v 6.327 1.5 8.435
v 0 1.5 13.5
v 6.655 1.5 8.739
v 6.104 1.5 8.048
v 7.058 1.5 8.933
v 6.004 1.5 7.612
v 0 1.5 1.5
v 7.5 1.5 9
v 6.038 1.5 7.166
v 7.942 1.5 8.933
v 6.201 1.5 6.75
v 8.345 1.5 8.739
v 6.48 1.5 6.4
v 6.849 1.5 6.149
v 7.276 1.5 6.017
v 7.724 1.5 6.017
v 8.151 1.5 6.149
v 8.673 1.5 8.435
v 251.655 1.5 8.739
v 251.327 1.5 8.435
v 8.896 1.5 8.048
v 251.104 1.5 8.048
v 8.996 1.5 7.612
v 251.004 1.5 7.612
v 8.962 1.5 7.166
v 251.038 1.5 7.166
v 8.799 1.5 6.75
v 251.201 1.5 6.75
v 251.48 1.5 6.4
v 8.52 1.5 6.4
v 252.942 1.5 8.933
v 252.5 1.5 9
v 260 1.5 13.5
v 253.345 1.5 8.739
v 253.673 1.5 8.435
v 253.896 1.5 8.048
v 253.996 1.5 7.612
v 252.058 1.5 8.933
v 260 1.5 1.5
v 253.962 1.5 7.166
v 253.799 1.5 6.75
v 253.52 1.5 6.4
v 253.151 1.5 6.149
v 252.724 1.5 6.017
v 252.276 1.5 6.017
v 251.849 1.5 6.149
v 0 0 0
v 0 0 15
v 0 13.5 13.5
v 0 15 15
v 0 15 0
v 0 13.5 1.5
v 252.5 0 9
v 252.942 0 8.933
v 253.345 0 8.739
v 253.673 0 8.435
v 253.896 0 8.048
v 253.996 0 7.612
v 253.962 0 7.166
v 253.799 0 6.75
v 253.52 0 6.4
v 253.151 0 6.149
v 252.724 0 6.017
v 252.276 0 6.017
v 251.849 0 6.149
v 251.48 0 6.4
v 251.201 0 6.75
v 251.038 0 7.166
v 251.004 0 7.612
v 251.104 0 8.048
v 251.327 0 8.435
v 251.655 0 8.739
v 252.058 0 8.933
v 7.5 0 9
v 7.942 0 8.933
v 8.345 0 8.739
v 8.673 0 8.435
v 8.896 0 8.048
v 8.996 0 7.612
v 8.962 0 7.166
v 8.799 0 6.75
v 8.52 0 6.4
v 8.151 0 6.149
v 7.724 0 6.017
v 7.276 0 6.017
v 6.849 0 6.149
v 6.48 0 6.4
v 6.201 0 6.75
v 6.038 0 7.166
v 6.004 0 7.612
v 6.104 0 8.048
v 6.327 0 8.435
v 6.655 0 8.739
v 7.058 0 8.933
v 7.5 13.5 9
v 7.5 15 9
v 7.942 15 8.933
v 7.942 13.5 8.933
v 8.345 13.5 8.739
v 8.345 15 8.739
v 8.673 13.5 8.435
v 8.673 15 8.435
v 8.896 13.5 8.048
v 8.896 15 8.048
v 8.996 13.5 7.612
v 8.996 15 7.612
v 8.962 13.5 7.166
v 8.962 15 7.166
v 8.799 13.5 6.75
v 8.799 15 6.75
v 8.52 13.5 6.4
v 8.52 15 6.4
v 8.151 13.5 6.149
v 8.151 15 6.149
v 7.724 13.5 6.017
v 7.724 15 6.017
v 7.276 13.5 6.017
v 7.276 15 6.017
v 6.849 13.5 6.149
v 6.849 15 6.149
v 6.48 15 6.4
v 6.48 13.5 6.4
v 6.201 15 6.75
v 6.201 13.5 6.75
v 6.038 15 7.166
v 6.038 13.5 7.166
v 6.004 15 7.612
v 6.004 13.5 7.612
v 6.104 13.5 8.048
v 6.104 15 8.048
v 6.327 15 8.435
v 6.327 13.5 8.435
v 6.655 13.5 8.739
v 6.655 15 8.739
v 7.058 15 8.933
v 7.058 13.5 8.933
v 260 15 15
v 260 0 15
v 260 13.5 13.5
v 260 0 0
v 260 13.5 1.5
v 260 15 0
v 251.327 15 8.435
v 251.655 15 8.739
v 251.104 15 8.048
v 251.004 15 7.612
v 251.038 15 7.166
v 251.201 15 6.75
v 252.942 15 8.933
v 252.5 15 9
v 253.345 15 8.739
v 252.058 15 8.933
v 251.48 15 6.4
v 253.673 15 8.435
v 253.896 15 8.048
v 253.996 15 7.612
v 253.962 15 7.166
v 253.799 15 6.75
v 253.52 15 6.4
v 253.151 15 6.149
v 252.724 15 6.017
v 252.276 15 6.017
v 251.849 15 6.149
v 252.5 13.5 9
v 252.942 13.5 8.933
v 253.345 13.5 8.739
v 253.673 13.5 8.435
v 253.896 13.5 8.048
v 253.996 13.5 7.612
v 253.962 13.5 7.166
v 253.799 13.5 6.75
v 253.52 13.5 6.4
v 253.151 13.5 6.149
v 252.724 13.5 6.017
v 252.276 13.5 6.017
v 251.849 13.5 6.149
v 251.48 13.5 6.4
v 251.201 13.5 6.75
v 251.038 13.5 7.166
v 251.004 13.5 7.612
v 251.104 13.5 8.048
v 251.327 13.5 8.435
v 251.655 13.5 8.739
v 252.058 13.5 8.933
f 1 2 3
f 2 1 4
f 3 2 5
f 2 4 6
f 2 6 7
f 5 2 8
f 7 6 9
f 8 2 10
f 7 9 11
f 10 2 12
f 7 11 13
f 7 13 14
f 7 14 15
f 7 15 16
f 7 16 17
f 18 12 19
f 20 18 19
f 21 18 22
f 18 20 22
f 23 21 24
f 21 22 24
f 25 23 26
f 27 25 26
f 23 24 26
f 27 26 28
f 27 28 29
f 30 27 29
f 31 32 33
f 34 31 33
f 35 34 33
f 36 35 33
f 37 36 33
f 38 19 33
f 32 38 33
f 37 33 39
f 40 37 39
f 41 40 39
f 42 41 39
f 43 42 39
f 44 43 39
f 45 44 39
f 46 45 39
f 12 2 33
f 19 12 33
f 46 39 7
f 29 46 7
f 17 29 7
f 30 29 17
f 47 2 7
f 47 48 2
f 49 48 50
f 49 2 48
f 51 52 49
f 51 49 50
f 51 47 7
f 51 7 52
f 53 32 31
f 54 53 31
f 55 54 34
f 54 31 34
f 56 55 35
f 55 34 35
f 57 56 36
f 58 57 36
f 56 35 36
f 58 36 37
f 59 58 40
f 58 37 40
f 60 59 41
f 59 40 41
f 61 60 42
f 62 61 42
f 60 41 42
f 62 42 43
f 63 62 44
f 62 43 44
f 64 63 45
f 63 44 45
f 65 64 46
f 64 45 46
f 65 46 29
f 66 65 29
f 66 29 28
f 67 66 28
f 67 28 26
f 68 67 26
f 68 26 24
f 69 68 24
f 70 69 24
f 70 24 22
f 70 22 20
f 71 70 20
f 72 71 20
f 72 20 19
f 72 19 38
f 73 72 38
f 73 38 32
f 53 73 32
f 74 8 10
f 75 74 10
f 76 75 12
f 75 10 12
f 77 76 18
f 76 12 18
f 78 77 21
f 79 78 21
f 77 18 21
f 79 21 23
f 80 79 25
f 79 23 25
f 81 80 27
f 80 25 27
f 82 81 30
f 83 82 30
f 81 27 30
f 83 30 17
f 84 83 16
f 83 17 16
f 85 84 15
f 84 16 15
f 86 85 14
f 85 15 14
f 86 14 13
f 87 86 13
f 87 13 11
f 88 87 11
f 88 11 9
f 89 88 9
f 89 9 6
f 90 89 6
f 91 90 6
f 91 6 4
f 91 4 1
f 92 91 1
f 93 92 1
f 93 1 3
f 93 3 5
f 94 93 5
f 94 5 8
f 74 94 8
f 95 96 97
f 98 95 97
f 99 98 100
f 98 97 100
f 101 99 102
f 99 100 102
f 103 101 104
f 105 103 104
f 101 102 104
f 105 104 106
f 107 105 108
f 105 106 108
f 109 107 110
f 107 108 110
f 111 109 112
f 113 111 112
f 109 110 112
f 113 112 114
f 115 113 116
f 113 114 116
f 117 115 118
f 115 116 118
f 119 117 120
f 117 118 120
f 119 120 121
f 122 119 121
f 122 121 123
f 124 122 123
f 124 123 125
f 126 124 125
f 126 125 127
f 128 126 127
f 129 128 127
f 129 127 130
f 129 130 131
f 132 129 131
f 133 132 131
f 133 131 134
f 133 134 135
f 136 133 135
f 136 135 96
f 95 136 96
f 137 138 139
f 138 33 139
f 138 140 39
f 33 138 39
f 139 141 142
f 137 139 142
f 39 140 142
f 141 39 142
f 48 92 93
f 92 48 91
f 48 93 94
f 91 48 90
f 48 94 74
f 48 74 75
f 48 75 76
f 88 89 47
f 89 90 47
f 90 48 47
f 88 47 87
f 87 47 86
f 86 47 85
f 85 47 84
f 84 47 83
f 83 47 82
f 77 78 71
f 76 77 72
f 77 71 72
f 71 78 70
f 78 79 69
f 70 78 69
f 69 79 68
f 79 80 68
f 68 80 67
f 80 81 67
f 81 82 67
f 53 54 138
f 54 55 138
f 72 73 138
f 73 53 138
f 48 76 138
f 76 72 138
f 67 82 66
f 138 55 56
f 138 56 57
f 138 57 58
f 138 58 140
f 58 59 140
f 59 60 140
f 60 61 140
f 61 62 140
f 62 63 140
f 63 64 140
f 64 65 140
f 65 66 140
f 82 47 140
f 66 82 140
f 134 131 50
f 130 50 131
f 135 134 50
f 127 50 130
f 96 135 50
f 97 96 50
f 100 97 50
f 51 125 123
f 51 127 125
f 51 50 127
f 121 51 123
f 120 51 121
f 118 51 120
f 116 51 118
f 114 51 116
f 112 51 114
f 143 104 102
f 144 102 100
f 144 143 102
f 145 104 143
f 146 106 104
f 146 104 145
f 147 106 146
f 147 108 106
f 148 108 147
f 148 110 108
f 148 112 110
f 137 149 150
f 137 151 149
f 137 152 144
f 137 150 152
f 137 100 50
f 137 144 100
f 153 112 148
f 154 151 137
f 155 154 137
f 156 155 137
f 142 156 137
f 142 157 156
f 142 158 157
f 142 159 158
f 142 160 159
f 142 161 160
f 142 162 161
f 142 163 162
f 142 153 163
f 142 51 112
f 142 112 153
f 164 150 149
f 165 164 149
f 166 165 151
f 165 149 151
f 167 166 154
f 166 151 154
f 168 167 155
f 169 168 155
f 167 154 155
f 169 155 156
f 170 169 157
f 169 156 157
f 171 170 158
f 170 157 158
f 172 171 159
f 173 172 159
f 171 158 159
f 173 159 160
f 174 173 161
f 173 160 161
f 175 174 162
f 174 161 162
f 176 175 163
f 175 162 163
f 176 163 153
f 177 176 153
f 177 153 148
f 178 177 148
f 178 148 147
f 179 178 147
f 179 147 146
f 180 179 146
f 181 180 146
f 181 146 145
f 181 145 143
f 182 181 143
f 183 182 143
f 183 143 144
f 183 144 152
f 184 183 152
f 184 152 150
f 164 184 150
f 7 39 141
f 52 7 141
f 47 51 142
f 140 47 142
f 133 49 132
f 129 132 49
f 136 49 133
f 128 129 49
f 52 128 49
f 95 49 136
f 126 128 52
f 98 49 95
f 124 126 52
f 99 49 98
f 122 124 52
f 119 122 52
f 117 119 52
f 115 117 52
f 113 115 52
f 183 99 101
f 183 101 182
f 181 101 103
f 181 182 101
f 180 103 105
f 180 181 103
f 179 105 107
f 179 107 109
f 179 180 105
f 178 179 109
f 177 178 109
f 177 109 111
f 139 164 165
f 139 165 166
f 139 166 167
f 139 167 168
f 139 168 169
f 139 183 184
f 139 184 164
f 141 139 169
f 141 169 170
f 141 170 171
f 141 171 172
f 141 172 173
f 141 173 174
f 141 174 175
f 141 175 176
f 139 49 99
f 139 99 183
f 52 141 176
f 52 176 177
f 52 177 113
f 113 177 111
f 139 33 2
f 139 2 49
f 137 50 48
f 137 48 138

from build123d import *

# Parameters (mm, degrees)
SKETCH_2_W          = 260
SKETCH_2_H          = 15
EXTRUDE_1_DEPTH     = 15
SKETCH_3_R          = 1.5
CUT_EXTRUDE_1_DEPTH = 261.863949215
SKETCH_4_W          = 12
SKETCH_4_H          = 12
CUT_EXTRUDE_2_DEPTH = 261.863949215


with BuildPart() as part:
    # ｽｹｯﾁ2 → ﾎﾞｽ - 押し出し1 (new body)
    with BuildSketch(Plane.XY):
        with Locations((130, 7.5)):
            Rectangle(SKETCH_2_W, SKETCH_2_H)
    extrude(amount=EXTRUDE_1_DEPTH)

    # ｽｹｯﾁ3 → ｶｯﾄ - 押し出し1 (cut, through all)
    with BuildSketch(Plane(origin=(0, 15, 0), x_dir=(1, 0, 0), z_dir=(0, 1, 0))):
        with Locations(Location((7.5, -7.5, 0), (0, 0, 270))):
            Circle(SKETCH_3_R)
        with Locations(Location((252.5, -7.5, 0), (0, 0, 270))):
            Circle(SKETCH_3_R)
    extrude(amount=-CUT_EXTRUDE_1_DEPTH, mode=Mode.SUBTRACT)

    # ｽｹｯﾁ4 → ｶｯﾄ - 押し出し2 (cut, through all)
    with BuildSketch(Plane(origin=(260, 0, 0), x_dir=(0, 0, -1), z_dir=(1, 0, 0))):
        with Locations((-7.5, 7.5)):
            Rectangle(SKETCH_4_W, SKETCH_4_H)
    extrude(amount=-CUT_EXTRUDE_2_DEPTH, mode=Mode.SUBTRACT)


solid = part.part
